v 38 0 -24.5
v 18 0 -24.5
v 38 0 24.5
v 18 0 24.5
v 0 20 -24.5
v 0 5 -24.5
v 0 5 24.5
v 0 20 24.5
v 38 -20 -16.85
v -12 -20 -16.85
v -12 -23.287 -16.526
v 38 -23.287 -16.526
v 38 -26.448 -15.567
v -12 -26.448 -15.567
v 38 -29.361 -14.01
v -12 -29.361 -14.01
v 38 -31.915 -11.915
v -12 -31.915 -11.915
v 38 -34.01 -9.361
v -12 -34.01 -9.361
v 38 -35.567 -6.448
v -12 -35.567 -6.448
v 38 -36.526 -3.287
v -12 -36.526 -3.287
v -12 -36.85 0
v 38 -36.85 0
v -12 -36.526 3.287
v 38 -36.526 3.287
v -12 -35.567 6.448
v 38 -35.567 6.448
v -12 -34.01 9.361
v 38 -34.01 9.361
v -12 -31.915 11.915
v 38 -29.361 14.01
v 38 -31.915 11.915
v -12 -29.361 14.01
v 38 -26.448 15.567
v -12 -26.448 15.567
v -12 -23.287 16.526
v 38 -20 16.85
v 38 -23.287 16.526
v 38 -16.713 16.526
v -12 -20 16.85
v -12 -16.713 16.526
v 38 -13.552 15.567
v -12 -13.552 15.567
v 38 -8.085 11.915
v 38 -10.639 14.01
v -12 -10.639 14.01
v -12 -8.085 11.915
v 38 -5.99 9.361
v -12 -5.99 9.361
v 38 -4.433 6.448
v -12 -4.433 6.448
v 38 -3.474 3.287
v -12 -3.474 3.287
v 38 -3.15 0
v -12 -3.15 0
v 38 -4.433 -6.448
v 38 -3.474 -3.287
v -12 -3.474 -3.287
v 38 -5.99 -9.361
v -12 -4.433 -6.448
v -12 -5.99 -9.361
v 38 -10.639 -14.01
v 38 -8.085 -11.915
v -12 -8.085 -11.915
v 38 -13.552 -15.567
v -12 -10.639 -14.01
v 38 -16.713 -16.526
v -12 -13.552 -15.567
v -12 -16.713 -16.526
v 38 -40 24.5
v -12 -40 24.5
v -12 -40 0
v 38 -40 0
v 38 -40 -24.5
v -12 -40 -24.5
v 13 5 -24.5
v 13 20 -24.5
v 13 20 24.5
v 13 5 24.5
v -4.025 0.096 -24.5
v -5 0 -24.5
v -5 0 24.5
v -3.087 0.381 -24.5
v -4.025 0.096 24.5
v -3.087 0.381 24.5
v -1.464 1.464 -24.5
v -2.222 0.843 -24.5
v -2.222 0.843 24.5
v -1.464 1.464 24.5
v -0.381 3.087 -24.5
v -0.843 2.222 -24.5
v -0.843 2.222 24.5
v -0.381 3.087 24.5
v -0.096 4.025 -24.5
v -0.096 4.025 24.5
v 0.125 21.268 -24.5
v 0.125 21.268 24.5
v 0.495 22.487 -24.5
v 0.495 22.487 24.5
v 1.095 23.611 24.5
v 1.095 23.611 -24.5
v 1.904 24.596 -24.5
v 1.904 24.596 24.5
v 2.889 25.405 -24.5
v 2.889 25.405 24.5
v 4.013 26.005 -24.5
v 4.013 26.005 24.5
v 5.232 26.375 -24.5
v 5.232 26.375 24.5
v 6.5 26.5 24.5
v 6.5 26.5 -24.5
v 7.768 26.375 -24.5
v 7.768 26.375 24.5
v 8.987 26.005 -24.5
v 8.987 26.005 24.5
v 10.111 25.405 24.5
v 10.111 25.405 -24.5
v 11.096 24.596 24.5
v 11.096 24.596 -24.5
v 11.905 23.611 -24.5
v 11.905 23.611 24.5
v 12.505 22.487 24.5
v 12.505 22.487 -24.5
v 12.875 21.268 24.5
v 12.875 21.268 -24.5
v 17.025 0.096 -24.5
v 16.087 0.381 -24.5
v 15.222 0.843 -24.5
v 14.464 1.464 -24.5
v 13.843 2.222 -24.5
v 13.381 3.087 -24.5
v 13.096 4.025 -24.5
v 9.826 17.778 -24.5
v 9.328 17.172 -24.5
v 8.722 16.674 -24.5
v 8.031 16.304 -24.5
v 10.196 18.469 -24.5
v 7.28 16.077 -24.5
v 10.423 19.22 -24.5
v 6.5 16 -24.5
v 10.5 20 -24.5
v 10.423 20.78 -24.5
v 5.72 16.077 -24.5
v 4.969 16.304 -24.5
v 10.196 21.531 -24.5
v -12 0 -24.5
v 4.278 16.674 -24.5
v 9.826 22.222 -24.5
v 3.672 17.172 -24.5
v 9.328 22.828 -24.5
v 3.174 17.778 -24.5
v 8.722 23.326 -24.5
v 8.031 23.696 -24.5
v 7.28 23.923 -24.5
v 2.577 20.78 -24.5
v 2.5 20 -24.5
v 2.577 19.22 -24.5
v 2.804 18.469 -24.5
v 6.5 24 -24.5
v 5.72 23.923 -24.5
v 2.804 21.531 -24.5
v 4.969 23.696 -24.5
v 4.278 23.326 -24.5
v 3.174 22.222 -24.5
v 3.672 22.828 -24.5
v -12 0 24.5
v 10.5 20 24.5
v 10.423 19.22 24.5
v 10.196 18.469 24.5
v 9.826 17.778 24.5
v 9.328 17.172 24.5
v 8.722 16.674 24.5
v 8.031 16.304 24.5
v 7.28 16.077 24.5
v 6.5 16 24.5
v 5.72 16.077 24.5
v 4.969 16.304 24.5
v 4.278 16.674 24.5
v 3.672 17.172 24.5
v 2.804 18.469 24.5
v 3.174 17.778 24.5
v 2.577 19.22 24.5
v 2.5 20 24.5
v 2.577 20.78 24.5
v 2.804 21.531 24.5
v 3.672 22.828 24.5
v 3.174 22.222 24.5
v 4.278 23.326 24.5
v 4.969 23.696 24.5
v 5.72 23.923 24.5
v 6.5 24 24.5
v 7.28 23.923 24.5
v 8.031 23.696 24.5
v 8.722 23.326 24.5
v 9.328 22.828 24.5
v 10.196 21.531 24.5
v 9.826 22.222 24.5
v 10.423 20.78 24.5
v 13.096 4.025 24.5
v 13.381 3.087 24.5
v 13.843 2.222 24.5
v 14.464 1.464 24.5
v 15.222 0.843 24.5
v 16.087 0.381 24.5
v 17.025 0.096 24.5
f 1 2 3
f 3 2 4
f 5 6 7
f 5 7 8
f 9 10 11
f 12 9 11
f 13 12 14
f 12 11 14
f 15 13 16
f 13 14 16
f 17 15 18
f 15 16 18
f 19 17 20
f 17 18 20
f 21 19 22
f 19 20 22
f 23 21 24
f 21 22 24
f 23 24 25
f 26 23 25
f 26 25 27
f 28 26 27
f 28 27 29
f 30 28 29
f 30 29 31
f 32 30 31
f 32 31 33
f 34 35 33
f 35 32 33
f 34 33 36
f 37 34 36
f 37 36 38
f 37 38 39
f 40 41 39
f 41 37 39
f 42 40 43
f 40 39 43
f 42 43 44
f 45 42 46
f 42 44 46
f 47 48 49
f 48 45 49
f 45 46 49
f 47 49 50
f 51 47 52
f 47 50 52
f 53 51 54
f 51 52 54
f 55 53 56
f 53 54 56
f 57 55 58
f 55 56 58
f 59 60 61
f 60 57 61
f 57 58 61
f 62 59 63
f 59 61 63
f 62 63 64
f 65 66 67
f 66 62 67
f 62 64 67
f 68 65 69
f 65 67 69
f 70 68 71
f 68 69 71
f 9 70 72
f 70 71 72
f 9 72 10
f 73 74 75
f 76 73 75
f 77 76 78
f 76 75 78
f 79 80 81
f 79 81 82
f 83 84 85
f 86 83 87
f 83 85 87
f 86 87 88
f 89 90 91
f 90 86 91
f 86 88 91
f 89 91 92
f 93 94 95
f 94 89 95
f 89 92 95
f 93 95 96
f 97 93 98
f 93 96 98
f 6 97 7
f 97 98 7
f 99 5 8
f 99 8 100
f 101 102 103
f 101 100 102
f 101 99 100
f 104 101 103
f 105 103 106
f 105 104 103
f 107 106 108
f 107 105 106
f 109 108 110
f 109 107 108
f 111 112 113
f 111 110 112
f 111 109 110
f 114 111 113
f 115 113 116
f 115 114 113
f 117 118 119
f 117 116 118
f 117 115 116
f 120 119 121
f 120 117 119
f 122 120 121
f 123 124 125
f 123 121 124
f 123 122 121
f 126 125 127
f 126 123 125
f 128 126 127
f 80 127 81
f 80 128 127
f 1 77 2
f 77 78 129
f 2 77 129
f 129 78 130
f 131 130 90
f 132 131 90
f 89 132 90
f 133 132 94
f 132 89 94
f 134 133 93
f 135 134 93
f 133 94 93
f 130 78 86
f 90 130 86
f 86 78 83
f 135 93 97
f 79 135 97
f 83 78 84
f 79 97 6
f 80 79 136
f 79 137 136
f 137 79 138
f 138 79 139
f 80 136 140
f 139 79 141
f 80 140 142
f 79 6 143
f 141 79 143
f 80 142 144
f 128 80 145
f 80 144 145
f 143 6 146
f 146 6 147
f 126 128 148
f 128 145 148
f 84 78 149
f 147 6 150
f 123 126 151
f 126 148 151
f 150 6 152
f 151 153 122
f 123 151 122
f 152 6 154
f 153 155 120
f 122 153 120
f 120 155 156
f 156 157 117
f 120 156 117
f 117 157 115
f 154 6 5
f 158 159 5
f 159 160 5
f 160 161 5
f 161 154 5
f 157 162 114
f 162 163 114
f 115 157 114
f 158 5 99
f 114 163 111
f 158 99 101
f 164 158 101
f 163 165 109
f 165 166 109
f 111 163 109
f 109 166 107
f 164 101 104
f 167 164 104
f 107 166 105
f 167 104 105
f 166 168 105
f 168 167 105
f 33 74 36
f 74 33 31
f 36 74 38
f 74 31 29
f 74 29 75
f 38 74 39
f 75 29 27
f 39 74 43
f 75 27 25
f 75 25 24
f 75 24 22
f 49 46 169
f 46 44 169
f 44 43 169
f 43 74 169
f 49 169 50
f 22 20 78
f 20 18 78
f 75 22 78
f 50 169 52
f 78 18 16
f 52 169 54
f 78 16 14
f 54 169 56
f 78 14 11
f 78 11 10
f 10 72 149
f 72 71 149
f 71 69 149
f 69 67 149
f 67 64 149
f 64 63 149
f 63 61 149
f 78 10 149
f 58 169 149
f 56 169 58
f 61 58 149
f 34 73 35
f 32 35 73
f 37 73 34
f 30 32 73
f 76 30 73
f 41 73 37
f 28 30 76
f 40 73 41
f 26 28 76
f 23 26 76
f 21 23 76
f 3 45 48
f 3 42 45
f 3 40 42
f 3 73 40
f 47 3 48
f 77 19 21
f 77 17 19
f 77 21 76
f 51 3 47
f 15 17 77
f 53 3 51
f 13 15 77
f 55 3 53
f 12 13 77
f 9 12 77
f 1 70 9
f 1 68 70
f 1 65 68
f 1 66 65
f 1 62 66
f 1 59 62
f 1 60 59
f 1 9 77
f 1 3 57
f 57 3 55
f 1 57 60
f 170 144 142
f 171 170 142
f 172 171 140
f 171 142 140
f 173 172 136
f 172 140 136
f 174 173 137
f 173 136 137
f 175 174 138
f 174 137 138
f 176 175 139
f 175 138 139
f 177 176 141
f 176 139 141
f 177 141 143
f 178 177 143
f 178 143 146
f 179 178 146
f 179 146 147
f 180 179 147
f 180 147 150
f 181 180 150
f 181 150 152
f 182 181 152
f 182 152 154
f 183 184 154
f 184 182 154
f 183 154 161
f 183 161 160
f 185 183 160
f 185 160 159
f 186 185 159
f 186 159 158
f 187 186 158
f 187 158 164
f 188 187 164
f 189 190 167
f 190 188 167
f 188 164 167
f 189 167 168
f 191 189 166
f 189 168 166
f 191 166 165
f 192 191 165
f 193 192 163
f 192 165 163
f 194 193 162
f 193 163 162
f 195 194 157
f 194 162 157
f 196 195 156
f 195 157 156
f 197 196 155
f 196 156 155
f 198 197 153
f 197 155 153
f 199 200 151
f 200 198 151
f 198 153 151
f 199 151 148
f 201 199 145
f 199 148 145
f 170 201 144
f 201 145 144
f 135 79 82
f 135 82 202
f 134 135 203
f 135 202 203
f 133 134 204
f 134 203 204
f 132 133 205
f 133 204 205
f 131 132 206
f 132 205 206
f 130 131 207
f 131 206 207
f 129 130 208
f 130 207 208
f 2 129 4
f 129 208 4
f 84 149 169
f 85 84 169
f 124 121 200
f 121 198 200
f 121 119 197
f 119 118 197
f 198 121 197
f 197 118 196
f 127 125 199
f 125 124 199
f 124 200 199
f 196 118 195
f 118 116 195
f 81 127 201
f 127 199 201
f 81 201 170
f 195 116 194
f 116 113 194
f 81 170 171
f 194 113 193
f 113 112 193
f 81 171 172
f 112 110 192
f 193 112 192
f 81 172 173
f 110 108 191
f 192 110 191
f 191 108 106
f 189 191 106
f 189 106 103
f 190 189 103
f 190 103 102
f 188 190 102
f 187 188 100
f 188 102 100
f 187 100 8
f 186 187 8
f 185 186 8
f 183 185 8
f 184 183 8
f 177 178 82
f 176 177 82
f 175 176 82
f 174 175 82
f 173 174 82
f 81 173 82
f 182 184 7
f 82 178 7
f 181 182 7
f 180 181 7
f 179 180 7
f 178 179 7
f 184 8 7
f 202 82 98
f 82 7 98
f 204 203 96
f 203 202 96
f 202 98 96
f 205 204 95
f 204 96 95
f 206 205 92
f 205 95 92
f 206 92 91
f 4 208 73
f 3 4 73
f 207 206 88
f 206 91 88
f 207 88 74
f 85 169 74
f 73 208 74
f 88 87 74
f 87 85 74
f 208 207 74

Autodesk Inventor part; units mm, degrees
ref_plane "YZ Plane" through (0, 0, 0) normal (1, 0, 0) x (0, 1, 0)
ref_plane "XZ Plane" through (0, 0, 0) normal (0, 1, 0) x (-1, 0, 0)
ref_plane "XY Plane" through (0, 0, 0) normal (0, 0, 1) x (1, 0, 0)
sketch "Sketch1" plane through (0, 0, 0) normal (0, 0, 1) x (1, 0, 0)
  line L0 (0, 0) -> (0, 20)
  circle A0 centre (6.5, 20) radius 6.5
  circle A1 centre (6.5, 20) radius 4
  line L1 (13, 20) -> (13, 0)
  line L2 (13, 0) -> (0, 0)
  dimension "d0" = 20
extrude "Extrusion1" add sketch "Sketch1" along normal mid plane 49
sketch "Sketch2" plane through (13, 0, 24.5) normal (1, 0, 0) x (0, 0, -1)
  line L0 (49, 0) -> (0, 0) projected
  line L1 (0, 0) -> (0, -40)
  line L2 (0, -40) -> (49, -40)
  line L3 (49, -40) -> (49, 0)
  line L4 (0, -40) -> (24.5, -40)
  line L5 (24.5, -40) -> (24.5, -20)
  circle A0 centre (24.5, -20) radius 20
  circle A1 centre (24.5, -20) radius 16.85
  point P0 (24.5, 0)
  dimension "d11" = 40
  dimension "d12" = 24.5
  dimension "d13" = 20
  dimension "d14" = 33.7
extrude "Extrusion2" add sketch "Sketch2" along normal mid plane 50
fillet "Fillet1" radius 5 1 edges at (13, 0, 0)
fillet "Fillet2" radius 5 1 edges at (0, 0, 0)
properties part number "PlacaExcavacion2"
